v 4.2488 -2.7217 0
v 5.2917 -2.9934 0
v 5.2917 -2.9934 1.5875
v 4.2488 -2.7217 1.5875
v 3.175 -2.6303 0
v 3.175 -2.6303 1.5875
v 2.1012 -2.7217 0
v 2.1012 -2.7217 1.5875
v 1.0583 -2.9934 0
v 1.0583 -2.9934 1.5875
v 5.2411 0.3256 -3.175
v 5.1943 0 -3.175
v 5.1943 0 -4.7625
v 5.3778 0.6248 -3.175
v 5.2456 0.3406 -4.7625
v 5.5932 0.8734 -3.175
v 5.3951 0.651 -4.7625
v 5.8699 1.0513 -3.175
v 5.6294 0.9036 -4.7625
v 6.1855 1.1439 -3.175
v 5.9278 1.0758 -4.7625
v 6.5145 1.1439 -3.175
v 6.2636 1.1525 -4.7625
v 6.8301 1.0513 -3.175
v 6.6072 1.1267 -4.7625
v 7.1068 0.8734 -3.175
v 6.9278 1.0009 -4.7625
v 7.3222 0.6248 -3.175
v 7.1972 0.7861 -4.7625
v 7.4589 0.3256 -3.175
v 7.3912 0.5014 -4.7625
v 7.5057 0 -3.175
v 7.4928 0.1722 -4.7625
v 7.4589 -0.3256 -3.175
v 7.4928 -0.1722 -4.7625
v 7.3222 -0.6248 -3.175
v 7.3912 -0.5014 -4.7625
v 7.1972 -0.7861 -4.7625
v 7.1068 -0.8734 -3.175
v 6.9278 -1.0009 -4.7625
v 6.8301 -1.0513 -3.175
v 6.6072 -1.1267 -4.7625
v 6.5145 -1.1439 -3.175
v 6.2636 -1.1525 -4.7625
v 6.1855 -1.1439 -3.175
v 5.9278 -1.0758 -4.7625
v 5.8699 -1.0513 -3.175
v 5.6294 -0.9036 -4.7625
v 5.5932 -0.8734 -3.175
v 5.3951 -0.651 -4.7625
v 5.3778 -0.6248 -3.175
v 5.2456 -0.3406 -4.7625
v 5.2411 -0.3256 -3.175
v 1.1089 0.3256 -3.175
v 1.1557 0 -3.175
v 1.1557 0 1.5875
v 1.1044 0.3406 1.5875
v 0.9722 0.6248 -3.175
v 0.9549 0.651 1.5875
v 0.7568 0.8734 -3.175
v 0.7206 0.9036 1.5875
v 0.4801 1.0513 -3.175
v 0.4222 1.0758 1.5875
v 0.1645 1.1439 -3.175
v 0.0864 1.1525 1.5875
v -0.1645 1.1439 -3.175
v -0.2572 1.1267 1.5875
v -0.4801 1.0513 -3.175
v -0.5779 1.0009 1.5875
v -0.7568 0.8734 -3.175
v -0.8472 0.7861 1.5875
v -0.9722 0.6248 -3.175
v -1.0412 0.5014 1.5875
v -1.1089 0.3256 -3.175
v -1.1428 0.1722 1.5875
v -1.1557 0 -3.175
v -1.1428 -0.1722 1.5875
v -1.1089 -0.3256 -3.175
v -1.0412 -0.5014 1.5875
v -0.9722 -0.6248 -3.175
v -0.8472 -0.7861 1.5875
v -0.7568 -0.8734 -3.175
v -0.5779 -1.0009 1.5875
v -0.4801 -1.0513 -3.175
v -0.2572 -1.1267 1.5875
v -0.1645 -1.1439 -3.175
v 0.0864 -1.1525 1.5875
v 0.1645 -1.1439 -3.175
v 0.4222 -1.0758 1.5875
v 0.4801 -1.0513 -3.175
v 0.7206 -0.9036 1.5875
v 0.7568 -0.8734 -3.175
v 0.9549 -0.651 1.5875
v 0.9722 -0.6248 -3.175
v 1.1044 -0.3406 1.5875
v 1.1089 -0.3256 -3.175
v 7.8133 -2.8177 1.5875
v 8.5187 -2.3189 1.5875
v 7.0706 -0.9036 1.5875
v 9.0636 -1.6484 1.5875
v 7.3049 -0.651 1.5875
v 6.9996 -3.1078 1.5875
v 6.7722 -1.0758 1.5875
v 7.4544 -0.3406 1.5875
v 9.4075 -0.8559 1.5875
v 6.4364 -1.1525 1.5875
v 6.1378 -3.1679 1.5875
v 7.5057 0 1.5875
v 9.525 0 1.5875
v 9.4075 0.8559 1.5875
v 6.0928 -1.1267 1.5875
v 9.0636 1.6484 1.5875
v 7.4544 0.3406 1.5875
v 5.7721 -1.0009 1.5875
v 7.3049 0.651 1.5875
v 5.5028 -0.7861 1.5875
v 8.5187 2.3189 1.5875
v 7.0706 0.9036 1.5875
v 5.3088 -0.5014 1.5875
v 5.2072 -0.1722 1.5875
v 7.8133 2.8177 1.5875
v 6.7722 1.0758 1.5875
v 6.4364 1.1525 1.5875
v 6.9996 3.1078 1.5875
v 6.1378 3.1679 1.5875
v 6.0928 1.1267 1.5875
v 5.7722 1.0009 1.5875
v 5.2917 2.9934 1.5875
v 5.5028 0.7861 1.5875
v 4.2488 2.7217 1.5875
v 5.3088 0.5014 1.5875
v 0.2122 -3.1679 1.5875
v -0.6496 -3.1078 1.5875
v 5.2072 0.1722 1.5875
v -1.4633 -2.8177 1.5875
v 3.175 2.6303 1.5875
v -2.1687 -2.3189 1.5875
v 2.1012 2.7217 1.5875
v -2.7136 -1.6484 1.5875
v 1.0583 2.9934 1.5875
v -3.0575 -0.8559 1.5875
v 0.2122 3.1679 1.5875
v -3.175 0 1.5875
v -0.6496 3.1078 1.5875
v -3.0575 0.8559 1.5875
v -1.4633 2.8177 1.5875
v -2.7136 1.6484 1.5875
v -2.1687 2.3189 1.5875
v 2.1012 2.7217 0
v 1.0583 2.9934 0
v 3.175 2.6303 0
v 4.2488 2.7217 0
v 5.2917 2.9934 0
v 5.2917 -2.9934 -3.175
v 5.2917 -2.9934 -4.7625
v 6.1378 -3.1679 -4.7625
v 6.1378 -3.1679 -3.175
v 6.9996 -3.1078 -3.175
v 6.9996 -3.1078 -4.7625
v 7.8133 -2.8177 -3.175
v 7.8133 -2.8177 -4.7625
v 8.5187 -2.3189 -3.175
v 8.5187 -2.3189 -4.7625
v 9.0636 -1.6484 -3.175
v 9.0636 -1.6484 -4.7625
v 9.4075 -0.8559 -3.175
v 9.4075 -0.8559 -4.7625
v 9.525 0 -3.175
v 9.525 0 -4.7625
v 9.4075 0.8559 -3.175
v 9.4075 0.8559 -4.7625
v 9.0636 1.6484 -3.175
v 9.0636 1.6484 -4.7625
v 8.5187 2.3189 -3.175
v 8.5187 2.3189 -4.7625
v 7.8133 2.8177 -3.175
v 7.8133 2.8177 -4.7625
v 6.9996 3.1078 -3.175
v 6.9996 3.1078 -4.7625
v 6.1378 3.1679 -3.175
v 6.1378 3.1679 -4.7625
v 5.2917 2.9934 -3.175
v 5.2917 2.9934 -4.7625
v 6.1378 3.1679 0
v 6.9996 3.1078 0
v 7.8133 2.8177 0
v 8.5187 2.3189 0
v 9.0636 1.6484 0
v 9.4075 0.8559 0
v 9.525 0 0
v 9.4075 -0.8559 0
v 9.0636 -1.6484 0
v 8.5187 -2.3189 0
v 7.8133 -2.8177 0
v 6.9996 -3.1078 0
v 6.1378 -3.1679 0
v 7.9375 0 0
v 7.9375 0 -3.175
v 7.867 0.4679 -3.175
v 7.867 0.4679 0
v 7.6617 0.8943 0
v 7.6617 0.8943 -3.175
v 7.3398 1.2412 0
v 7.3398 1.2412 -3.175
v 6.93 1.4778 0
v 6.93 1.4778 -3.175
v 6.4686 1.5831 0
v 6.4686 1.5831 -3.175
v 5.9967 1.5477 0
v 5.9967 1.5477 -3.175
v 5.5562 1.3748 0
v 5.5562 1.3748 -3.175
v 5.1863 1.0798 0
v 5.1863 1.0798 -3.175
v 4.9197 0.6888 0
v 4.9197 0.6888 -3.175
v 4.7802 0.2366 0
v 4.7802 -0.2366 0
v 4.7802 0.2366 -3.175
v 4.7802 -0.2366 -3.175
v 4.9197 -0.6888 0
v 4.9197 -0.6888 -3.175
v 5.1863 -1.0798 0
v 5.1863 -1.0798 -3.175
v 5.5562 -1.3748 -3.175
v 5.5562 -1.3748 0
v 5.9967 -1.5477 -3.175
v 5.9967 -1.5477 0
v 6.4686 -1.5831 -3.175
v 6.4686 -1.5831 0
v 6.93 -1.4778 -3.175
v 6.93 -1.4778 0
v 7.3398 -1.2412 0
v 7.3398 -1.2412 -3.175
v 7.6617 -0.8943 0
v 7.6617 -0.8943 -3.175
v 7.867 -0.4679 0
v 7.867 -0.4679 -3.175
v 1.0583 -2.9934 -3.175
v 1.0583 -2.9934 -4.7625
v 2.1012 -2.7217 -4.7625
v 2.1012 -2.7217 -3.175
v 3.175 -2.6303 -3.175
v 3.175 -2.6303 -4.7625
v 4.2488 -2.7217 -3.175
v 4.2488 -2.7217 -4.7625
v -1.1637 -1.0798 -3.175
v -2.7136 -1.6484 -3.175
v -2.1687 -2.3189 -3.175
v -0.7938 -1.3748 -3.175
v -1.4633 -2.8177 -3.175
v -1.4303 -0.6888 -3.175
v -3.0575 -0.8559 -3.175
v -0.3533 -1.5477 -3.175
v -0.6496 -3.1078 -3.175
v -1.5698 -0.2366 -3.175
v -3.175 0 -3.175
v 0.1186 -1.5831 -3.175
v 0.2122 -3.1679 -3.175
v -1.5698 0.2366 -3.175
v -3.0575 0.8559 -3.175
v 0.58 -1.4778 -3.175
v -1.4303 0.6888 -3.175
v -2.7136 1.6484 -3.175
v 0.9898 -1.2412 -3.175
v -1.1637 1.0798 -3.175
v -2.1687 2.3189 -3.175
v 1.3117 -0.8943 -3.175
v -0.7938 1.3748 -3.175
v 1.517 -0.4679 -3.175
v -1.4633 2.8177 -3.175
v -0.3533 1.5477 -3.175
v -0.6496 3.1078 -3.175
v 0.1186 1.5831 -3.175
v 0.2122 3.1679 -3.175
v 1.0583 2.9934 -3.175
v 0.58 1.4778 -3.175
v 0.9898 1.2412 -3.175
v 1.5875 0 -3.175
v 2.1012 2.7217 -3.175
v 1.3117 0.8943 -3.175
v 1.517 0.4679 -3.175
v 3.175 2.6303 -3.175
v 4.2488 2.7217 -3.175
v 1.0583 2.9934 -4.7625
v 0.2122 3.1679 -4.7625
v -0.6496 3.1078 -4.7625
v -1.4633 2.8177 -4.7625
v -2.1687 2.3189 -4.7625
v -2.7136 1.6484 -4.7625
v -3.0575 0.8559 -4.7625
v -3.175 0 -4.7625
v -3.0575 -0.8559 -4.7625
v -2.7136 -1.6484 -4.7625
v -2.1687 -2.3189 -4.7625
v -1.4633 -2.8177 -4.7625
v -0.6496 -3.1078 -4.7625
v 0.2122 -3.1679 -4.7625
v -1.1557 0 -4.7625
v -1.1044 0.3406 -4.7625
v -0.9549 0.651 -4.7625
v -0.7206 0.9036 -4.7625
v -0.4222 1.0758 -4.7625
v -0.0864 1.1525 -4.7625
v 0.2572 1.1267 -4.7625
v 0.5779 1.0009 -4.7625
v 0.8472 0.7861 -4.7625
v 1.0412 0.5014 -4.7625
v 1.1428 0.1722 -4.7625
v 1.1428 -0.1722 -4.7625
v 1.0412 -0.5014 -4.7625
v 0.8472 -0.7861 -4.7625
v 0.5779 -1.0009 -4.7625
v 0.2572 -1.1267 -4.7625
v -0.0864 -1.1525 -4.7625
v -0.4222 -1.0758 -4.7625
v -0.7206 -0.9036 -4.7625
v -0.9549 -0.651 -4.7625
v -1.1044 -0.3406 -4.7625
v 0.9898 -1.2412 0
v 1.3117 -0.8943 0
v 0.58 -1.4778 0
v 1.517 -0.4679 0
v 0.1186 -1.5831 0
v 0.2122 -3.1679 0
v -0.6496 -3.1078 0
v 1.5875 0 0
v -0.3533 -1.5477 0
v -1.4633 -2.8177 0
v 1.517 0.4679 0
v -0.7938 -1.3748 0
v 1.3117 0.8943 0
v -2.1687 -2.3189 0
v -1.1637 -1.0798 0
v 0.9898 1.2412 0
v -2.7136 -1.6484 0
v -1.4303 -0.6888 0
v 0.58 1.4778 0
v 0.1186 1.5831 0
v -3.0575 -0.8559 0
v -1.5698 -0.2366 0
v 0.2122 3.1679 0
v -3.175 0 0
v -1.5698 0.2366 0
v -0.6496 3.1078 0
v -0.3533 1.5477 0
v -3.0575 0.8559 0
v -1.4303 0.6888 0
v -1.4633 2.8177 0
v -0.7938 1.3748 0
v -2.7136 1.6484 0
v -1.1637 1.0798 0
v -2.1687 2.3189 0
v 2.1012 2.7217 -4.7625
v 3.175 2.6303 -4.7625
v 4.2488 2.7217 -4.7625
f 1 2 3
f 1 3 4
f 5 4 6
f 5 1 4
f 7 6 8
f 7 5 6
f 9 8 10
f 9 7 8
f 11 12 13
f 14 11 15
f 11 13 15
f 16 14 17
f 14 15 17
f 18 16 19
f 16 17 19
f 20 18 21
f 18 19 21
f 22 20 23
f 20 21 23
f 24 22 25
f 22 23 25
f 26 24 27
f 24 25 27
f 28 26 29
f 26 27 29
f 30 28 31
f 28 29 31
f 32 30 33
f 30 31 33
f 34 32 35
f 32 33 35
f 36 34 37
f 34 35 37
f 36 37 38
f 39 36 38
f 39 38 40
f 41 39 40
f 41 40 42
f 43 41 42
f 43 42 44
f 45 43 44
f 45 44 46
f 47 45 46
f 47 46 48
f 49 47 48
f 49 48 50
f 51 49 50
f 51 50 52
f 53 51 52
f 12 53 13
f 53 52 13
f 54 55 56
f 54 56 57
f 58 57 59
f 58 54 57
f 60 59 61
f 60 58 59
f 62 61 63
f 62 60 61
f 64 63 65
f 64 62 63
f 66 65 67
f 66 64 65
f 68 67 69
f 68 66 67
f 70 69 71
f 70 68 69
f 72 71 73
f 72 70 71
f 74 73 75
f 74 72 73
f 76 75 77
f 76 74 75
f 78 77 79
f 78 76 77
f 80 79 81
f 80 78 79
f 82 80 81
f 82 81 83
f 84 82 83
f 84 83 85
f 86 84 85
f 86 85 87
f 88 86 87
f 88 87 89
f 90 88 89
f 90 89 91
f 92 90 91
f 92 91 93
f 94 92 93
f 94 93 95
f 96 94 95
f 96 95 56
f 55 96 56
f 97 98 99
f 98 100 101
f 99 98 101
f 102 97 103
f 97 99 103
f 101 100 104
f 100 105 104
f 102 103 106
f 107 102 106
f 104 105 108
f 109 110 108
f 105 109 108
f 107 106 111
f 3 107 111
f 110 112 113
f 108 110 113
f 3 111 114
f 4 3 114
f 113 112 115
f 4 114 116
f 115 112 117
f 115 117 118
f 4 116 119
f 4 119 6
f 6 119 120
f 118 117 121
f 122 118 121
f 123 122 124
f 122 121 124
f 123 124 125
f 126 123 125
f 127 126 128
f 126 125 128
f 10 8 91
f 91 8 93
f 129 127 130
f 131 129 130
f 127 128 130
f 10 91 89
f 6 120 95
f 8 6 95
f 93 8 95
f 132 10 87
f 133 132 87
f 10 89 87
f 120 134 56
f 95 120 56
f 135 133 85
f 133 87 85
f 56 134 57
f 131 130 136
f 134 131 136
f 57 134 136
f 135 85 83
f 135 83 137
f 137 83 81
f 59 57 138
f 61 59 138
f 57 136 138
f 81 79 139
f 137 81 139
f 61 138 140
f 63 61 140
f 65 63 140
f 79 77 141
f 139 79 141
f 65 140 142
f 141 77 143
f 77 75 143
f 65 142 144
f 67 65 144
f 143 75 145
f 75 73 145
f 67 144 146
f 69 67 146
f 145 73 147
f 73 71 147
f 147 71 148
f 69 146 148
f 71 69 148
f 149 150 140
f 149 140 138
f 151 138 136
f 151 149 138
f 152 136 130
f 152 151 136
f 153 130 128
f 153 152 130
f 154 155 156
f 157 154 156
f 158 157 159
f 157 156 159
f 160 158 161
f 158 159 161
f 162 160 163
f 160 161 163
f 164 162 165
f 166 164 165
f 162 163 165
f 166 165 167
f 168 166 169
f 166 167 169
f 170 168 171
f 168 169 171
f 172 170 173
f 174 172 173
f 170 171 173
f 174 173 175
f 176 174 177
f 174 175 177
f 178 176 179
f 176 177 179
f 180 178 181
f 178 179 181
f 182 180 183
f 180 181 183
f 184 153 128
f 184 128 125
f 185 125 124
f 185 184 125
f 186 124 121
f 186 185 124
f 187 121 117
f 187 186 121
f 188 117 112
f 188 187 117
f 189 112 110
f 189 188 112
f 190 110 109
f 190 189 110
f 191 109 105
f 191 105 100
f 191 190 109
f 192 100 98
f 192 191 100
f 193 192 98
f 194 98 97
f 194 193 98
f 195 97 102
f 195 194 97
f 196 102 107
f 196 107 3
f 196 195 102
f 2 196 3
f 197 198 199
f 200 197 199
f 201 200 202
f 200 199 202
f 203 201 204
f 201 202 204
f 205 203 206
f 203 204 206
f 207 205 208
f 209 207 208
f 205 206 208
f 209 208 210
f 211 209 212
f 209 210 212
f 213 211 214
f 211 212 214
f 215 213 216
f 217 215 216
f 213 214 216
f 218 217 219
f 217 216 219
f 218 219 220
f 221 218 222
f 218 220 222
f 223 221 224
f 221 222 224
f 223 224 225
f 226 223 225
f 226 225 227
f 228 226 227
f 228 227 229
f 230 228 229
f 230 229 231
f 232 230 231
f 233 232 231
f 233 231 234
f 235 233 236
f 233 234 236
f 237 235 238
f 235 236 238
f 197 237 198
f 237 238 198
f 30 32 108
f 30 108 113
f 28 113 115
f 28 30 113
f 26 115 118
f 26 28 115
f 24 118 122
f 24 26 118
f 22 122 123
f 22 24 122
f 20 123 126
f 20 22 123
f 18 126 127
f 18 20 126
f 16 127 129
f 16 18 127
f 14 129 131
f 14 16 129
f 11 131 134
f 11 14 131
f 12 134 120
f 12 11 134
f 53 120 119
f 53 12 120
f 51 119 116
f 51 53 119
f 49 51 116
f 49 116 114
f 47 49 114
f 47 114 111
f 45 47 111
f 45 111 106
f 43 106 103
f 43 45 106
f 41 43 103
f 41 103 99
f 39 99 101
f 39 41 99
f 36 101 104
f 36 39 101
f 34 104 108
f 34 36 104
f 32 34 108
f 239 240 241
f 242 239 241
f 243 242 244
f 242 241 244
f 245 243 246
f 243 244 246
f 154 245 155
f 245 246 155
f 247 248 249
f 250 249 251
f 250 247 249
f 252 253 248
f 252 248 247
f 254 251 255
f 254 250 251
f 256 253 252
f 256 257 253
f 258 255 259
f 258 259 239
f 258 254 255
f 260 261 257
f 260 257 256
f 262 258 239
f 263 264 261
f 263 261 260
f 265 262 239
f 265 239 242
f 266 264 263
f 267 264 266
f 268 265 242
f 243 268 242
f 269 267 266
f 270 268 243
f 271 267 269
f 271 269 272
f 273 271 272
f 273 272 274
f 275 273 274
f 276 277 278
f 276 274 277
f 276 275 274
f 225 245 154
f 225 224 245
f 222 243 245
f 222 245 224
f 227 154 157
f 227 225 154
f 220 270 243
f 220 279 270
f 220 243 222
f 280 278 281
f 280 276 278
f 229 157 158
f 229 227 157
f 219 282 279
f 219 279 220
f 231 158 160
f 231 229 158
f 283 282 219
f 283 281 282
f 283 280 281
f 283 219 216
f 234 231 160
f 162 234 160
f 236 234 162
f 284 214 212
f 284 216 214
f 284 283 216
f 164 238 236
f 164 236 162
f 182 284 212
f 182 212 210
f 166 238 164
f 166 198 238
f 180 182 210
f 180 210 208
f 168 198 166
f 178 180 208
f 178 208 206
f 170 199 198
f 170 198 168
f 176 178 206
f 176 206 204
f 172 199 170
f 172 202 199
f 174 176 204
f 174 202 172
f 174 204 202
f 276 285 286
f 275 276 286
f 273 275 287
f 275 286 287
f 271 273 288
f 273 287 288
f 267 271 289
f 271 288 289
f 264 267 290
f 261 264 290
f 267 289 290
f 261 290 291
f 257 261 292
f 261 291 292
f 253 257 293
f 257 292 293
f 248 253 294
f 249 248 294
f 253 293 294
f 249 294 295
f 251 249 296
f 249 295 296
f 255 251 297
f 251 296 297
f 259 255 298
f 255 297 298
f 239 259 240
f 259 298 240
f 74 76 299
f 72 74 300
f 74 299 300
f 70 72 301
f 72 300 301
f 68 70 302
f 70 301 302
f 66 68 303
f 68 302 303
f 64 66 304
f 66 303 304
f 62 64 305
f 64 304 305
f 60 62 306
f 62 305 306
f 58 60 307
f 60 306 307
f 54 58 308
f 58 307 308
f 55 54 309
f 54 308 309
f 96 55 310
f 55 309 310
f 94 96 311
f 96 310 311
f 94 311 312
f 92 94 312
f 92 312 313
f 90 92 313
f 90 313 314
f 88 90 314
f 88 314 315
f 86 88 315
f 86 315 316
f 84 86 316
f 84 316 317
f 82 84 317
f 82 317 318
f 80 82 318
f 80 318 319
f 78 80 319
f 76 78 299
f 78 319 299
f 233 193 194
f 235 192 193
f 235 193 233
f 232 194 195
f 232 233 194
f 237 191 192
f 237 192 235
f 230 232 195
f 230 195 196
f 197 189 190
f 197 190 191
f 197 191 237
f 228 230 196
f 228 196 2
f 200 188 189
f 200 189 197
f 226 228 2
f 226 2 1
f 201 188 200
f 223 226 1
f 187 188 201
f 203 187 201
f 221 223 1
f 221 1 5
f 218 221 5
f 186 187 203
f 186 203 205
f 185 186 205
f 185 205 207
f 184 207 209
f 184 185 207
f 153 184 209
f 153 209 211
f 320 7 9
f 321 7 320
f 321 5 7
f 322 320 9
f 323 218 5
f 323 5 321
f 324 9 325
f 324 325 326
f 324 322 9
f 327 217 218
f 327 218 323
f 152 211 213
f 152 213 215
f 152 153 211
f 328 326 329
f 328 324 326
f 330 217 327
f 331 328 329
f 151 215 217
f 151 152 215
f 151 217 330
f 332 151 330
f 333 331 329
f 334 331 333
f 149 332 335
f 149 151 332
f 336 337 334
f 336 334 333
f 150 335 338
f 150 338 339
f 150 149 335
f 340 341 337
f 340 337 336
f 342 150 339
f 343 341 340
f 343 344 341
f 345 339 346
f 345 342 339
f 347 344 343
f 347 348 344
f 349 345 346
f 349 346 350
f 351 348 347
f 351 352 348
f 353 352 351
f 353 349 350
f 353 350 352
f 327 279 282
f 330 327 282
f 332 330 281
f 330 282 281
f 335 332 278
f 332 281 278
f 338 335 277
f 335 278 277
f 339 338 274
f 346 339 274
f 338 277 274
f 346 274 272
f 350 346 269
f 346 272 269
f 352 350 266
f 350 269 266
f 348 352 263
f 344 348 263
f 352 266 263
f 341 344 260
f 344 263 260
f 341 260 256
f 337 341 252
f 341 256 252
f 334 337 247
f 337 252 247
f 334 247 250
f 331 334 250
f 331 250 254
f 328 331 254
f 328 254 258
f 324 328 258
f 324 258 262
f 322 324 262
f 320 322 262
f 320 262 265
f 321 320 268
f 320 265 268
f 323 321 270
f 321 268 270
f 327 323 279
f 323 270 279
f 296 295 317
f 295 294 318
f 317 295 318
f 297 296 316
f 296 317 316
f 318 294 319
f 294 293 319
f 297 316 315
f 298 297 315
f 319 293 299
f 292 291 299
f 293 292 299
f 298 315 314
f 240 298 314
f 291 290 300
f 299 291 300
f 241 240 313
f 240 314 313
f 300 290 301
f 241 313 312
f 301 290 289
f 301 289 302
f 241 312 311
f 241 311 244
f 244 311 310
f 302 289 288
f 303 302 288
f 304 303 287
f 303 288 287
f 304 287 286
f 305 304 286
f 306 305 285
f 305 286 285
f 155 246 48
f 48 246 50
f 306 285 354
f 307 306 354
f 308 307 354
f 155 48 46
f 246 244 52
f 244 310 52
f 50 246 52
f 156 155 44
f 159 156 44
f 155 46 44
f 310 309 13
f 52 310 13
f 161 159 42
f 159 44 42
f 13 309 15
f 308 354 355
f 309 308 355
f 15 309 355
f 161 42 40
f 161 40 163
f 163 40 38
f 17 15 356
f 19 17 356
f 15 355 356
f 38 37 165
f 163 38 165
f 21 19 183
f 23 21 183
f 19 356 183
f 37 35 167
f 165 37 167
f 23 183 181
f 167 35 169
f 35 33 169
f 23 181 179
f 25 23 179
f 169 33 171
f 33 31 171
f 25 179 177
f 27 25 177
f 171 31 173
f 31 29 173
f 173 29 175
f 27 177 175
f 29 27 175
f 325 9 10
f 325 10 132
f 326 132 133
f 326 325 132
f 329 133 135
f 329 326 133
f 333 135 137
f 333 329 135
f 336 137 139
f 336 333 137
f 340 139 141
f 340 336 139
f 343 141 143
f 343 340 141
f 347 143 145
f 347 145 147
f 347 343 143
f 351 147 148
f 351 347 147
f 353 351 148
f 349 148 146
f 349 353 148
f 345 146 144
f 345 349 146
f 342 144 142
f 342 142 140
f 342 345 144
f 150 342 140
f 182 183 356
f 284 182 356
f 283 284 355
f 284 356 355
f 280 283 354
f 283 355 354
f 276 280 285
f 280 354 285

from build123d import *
from build123d.topology import SkipClean

# Parameters (mm, degrees)
SKETCH1_R           = 1.1557
BOSS_EXTRUDE1_DEPTH = 1.5875
BOSS_EXTRUDE2_START = -3.175
SKETCH1_3_R         = 1.5875
SKETCH1_3_R_2       = 1.1557
BOSS_EXTRUDE2_DEPTH = 3.175
BOSS_EXTRUDE3_START = 1.5875
SKETCH2_R           = 1.1557
BOSS_EXTRUDE3_DEPTH = 1.5875


with BuildPart() as part:
    # Sketch1 → Boss-Extrude1 (new body)
    with BuildSketch(Plane.XY):
        with BuildLine():
            ThreePointArc((1.058333333, 2.993418707), (-3.175, 0), (1.058333333, -2.993418707))
            ThreePointArc((1.058333333, -2.993418707), (3.175, -2.630256121), (5.291666667, -2.993418707))
            ThreePointArc((5.291666667, -2.993418707), (9.525, 0), (5.291666667, 2.993418707))
            ThreePointArc((5.291666667, 2.993418707), (3.175, 2.630256121), (1.058333333, 2.993418707))
        make_face()
        Circle(SKETCH1_R, mode=Mode.SUBTRACT)
        with Locations((6.35, 0)):
            Circle(SKETCH1_R, mode=Mode.SUBTRACT)
    extrude(amount=BOSS_EXTRUDE1_DEPTH)

    # Sketch1<3> → Boss-Extrude2 (add)
    # profile 1 of 2: a face of its own
    with BuildSketch(Plane.XY.offset(BOSS_EXTRUDE2_START)):
        Circle(SKETCH1_3_R)
        Circle(SKETCH1_3_R_2, mode=Mode.SUBTRACT)
    # profile 2 of 2: a face of its own
    with BuildSketch(Plane.XY.offset(BOSS_EXTRUDE2_START)):
        with Locations((6.35, 0)):
            Circle(SKETCH1_3_R)
        with Locations((6.35, 0)):
            Circle(SKETCH1_3_R_2, mode=Mode.SUBTRACT)
    extrude(amount=BOSS_EXTRUDE2_DEPTH)

    # Sketch2 → Boss-Extrude3 (add)
    with SkipClean():  # the faces are left unmerged after this step: merging them gives an invalid solid
        with BuildSketch(Plane(origin=(0, 0, -3.175), x_dir=(-1, 0, 0), z_dir=(0, 0, -1)).offset(BOSS_EXTRUDE3_START)):
            with BuildLine():
                ThreePointArc((-1.058333333, 2.993418707), (3.175, 0), (-1.058333333, -2.993418707))
                ThreePointArc((-1.058333333, -2.993418707), (-3.175, -2.630256121), (-5.291666667, -2.993418707))
                ThreePointArc((-5.291666667, -2.993418707), (-9.525, 0), (-5.291666667, 2.993418707))
                ThreePointArc((-5.291666667, 2.993418707), (-3.175, 2.630256121), (-1.058333333, 2.993418707))
            make_face()
            with Locations((-6.35, 0)):
                Circle(SKETCH2_R, mode=Mode.SUBTRACT)
            Circle(SKETCH2_R, mode=Mode.SUBTRACT)
        extrude(amount=-BOSS_EXTRUDE3_DEPTH)


solid = part.part
